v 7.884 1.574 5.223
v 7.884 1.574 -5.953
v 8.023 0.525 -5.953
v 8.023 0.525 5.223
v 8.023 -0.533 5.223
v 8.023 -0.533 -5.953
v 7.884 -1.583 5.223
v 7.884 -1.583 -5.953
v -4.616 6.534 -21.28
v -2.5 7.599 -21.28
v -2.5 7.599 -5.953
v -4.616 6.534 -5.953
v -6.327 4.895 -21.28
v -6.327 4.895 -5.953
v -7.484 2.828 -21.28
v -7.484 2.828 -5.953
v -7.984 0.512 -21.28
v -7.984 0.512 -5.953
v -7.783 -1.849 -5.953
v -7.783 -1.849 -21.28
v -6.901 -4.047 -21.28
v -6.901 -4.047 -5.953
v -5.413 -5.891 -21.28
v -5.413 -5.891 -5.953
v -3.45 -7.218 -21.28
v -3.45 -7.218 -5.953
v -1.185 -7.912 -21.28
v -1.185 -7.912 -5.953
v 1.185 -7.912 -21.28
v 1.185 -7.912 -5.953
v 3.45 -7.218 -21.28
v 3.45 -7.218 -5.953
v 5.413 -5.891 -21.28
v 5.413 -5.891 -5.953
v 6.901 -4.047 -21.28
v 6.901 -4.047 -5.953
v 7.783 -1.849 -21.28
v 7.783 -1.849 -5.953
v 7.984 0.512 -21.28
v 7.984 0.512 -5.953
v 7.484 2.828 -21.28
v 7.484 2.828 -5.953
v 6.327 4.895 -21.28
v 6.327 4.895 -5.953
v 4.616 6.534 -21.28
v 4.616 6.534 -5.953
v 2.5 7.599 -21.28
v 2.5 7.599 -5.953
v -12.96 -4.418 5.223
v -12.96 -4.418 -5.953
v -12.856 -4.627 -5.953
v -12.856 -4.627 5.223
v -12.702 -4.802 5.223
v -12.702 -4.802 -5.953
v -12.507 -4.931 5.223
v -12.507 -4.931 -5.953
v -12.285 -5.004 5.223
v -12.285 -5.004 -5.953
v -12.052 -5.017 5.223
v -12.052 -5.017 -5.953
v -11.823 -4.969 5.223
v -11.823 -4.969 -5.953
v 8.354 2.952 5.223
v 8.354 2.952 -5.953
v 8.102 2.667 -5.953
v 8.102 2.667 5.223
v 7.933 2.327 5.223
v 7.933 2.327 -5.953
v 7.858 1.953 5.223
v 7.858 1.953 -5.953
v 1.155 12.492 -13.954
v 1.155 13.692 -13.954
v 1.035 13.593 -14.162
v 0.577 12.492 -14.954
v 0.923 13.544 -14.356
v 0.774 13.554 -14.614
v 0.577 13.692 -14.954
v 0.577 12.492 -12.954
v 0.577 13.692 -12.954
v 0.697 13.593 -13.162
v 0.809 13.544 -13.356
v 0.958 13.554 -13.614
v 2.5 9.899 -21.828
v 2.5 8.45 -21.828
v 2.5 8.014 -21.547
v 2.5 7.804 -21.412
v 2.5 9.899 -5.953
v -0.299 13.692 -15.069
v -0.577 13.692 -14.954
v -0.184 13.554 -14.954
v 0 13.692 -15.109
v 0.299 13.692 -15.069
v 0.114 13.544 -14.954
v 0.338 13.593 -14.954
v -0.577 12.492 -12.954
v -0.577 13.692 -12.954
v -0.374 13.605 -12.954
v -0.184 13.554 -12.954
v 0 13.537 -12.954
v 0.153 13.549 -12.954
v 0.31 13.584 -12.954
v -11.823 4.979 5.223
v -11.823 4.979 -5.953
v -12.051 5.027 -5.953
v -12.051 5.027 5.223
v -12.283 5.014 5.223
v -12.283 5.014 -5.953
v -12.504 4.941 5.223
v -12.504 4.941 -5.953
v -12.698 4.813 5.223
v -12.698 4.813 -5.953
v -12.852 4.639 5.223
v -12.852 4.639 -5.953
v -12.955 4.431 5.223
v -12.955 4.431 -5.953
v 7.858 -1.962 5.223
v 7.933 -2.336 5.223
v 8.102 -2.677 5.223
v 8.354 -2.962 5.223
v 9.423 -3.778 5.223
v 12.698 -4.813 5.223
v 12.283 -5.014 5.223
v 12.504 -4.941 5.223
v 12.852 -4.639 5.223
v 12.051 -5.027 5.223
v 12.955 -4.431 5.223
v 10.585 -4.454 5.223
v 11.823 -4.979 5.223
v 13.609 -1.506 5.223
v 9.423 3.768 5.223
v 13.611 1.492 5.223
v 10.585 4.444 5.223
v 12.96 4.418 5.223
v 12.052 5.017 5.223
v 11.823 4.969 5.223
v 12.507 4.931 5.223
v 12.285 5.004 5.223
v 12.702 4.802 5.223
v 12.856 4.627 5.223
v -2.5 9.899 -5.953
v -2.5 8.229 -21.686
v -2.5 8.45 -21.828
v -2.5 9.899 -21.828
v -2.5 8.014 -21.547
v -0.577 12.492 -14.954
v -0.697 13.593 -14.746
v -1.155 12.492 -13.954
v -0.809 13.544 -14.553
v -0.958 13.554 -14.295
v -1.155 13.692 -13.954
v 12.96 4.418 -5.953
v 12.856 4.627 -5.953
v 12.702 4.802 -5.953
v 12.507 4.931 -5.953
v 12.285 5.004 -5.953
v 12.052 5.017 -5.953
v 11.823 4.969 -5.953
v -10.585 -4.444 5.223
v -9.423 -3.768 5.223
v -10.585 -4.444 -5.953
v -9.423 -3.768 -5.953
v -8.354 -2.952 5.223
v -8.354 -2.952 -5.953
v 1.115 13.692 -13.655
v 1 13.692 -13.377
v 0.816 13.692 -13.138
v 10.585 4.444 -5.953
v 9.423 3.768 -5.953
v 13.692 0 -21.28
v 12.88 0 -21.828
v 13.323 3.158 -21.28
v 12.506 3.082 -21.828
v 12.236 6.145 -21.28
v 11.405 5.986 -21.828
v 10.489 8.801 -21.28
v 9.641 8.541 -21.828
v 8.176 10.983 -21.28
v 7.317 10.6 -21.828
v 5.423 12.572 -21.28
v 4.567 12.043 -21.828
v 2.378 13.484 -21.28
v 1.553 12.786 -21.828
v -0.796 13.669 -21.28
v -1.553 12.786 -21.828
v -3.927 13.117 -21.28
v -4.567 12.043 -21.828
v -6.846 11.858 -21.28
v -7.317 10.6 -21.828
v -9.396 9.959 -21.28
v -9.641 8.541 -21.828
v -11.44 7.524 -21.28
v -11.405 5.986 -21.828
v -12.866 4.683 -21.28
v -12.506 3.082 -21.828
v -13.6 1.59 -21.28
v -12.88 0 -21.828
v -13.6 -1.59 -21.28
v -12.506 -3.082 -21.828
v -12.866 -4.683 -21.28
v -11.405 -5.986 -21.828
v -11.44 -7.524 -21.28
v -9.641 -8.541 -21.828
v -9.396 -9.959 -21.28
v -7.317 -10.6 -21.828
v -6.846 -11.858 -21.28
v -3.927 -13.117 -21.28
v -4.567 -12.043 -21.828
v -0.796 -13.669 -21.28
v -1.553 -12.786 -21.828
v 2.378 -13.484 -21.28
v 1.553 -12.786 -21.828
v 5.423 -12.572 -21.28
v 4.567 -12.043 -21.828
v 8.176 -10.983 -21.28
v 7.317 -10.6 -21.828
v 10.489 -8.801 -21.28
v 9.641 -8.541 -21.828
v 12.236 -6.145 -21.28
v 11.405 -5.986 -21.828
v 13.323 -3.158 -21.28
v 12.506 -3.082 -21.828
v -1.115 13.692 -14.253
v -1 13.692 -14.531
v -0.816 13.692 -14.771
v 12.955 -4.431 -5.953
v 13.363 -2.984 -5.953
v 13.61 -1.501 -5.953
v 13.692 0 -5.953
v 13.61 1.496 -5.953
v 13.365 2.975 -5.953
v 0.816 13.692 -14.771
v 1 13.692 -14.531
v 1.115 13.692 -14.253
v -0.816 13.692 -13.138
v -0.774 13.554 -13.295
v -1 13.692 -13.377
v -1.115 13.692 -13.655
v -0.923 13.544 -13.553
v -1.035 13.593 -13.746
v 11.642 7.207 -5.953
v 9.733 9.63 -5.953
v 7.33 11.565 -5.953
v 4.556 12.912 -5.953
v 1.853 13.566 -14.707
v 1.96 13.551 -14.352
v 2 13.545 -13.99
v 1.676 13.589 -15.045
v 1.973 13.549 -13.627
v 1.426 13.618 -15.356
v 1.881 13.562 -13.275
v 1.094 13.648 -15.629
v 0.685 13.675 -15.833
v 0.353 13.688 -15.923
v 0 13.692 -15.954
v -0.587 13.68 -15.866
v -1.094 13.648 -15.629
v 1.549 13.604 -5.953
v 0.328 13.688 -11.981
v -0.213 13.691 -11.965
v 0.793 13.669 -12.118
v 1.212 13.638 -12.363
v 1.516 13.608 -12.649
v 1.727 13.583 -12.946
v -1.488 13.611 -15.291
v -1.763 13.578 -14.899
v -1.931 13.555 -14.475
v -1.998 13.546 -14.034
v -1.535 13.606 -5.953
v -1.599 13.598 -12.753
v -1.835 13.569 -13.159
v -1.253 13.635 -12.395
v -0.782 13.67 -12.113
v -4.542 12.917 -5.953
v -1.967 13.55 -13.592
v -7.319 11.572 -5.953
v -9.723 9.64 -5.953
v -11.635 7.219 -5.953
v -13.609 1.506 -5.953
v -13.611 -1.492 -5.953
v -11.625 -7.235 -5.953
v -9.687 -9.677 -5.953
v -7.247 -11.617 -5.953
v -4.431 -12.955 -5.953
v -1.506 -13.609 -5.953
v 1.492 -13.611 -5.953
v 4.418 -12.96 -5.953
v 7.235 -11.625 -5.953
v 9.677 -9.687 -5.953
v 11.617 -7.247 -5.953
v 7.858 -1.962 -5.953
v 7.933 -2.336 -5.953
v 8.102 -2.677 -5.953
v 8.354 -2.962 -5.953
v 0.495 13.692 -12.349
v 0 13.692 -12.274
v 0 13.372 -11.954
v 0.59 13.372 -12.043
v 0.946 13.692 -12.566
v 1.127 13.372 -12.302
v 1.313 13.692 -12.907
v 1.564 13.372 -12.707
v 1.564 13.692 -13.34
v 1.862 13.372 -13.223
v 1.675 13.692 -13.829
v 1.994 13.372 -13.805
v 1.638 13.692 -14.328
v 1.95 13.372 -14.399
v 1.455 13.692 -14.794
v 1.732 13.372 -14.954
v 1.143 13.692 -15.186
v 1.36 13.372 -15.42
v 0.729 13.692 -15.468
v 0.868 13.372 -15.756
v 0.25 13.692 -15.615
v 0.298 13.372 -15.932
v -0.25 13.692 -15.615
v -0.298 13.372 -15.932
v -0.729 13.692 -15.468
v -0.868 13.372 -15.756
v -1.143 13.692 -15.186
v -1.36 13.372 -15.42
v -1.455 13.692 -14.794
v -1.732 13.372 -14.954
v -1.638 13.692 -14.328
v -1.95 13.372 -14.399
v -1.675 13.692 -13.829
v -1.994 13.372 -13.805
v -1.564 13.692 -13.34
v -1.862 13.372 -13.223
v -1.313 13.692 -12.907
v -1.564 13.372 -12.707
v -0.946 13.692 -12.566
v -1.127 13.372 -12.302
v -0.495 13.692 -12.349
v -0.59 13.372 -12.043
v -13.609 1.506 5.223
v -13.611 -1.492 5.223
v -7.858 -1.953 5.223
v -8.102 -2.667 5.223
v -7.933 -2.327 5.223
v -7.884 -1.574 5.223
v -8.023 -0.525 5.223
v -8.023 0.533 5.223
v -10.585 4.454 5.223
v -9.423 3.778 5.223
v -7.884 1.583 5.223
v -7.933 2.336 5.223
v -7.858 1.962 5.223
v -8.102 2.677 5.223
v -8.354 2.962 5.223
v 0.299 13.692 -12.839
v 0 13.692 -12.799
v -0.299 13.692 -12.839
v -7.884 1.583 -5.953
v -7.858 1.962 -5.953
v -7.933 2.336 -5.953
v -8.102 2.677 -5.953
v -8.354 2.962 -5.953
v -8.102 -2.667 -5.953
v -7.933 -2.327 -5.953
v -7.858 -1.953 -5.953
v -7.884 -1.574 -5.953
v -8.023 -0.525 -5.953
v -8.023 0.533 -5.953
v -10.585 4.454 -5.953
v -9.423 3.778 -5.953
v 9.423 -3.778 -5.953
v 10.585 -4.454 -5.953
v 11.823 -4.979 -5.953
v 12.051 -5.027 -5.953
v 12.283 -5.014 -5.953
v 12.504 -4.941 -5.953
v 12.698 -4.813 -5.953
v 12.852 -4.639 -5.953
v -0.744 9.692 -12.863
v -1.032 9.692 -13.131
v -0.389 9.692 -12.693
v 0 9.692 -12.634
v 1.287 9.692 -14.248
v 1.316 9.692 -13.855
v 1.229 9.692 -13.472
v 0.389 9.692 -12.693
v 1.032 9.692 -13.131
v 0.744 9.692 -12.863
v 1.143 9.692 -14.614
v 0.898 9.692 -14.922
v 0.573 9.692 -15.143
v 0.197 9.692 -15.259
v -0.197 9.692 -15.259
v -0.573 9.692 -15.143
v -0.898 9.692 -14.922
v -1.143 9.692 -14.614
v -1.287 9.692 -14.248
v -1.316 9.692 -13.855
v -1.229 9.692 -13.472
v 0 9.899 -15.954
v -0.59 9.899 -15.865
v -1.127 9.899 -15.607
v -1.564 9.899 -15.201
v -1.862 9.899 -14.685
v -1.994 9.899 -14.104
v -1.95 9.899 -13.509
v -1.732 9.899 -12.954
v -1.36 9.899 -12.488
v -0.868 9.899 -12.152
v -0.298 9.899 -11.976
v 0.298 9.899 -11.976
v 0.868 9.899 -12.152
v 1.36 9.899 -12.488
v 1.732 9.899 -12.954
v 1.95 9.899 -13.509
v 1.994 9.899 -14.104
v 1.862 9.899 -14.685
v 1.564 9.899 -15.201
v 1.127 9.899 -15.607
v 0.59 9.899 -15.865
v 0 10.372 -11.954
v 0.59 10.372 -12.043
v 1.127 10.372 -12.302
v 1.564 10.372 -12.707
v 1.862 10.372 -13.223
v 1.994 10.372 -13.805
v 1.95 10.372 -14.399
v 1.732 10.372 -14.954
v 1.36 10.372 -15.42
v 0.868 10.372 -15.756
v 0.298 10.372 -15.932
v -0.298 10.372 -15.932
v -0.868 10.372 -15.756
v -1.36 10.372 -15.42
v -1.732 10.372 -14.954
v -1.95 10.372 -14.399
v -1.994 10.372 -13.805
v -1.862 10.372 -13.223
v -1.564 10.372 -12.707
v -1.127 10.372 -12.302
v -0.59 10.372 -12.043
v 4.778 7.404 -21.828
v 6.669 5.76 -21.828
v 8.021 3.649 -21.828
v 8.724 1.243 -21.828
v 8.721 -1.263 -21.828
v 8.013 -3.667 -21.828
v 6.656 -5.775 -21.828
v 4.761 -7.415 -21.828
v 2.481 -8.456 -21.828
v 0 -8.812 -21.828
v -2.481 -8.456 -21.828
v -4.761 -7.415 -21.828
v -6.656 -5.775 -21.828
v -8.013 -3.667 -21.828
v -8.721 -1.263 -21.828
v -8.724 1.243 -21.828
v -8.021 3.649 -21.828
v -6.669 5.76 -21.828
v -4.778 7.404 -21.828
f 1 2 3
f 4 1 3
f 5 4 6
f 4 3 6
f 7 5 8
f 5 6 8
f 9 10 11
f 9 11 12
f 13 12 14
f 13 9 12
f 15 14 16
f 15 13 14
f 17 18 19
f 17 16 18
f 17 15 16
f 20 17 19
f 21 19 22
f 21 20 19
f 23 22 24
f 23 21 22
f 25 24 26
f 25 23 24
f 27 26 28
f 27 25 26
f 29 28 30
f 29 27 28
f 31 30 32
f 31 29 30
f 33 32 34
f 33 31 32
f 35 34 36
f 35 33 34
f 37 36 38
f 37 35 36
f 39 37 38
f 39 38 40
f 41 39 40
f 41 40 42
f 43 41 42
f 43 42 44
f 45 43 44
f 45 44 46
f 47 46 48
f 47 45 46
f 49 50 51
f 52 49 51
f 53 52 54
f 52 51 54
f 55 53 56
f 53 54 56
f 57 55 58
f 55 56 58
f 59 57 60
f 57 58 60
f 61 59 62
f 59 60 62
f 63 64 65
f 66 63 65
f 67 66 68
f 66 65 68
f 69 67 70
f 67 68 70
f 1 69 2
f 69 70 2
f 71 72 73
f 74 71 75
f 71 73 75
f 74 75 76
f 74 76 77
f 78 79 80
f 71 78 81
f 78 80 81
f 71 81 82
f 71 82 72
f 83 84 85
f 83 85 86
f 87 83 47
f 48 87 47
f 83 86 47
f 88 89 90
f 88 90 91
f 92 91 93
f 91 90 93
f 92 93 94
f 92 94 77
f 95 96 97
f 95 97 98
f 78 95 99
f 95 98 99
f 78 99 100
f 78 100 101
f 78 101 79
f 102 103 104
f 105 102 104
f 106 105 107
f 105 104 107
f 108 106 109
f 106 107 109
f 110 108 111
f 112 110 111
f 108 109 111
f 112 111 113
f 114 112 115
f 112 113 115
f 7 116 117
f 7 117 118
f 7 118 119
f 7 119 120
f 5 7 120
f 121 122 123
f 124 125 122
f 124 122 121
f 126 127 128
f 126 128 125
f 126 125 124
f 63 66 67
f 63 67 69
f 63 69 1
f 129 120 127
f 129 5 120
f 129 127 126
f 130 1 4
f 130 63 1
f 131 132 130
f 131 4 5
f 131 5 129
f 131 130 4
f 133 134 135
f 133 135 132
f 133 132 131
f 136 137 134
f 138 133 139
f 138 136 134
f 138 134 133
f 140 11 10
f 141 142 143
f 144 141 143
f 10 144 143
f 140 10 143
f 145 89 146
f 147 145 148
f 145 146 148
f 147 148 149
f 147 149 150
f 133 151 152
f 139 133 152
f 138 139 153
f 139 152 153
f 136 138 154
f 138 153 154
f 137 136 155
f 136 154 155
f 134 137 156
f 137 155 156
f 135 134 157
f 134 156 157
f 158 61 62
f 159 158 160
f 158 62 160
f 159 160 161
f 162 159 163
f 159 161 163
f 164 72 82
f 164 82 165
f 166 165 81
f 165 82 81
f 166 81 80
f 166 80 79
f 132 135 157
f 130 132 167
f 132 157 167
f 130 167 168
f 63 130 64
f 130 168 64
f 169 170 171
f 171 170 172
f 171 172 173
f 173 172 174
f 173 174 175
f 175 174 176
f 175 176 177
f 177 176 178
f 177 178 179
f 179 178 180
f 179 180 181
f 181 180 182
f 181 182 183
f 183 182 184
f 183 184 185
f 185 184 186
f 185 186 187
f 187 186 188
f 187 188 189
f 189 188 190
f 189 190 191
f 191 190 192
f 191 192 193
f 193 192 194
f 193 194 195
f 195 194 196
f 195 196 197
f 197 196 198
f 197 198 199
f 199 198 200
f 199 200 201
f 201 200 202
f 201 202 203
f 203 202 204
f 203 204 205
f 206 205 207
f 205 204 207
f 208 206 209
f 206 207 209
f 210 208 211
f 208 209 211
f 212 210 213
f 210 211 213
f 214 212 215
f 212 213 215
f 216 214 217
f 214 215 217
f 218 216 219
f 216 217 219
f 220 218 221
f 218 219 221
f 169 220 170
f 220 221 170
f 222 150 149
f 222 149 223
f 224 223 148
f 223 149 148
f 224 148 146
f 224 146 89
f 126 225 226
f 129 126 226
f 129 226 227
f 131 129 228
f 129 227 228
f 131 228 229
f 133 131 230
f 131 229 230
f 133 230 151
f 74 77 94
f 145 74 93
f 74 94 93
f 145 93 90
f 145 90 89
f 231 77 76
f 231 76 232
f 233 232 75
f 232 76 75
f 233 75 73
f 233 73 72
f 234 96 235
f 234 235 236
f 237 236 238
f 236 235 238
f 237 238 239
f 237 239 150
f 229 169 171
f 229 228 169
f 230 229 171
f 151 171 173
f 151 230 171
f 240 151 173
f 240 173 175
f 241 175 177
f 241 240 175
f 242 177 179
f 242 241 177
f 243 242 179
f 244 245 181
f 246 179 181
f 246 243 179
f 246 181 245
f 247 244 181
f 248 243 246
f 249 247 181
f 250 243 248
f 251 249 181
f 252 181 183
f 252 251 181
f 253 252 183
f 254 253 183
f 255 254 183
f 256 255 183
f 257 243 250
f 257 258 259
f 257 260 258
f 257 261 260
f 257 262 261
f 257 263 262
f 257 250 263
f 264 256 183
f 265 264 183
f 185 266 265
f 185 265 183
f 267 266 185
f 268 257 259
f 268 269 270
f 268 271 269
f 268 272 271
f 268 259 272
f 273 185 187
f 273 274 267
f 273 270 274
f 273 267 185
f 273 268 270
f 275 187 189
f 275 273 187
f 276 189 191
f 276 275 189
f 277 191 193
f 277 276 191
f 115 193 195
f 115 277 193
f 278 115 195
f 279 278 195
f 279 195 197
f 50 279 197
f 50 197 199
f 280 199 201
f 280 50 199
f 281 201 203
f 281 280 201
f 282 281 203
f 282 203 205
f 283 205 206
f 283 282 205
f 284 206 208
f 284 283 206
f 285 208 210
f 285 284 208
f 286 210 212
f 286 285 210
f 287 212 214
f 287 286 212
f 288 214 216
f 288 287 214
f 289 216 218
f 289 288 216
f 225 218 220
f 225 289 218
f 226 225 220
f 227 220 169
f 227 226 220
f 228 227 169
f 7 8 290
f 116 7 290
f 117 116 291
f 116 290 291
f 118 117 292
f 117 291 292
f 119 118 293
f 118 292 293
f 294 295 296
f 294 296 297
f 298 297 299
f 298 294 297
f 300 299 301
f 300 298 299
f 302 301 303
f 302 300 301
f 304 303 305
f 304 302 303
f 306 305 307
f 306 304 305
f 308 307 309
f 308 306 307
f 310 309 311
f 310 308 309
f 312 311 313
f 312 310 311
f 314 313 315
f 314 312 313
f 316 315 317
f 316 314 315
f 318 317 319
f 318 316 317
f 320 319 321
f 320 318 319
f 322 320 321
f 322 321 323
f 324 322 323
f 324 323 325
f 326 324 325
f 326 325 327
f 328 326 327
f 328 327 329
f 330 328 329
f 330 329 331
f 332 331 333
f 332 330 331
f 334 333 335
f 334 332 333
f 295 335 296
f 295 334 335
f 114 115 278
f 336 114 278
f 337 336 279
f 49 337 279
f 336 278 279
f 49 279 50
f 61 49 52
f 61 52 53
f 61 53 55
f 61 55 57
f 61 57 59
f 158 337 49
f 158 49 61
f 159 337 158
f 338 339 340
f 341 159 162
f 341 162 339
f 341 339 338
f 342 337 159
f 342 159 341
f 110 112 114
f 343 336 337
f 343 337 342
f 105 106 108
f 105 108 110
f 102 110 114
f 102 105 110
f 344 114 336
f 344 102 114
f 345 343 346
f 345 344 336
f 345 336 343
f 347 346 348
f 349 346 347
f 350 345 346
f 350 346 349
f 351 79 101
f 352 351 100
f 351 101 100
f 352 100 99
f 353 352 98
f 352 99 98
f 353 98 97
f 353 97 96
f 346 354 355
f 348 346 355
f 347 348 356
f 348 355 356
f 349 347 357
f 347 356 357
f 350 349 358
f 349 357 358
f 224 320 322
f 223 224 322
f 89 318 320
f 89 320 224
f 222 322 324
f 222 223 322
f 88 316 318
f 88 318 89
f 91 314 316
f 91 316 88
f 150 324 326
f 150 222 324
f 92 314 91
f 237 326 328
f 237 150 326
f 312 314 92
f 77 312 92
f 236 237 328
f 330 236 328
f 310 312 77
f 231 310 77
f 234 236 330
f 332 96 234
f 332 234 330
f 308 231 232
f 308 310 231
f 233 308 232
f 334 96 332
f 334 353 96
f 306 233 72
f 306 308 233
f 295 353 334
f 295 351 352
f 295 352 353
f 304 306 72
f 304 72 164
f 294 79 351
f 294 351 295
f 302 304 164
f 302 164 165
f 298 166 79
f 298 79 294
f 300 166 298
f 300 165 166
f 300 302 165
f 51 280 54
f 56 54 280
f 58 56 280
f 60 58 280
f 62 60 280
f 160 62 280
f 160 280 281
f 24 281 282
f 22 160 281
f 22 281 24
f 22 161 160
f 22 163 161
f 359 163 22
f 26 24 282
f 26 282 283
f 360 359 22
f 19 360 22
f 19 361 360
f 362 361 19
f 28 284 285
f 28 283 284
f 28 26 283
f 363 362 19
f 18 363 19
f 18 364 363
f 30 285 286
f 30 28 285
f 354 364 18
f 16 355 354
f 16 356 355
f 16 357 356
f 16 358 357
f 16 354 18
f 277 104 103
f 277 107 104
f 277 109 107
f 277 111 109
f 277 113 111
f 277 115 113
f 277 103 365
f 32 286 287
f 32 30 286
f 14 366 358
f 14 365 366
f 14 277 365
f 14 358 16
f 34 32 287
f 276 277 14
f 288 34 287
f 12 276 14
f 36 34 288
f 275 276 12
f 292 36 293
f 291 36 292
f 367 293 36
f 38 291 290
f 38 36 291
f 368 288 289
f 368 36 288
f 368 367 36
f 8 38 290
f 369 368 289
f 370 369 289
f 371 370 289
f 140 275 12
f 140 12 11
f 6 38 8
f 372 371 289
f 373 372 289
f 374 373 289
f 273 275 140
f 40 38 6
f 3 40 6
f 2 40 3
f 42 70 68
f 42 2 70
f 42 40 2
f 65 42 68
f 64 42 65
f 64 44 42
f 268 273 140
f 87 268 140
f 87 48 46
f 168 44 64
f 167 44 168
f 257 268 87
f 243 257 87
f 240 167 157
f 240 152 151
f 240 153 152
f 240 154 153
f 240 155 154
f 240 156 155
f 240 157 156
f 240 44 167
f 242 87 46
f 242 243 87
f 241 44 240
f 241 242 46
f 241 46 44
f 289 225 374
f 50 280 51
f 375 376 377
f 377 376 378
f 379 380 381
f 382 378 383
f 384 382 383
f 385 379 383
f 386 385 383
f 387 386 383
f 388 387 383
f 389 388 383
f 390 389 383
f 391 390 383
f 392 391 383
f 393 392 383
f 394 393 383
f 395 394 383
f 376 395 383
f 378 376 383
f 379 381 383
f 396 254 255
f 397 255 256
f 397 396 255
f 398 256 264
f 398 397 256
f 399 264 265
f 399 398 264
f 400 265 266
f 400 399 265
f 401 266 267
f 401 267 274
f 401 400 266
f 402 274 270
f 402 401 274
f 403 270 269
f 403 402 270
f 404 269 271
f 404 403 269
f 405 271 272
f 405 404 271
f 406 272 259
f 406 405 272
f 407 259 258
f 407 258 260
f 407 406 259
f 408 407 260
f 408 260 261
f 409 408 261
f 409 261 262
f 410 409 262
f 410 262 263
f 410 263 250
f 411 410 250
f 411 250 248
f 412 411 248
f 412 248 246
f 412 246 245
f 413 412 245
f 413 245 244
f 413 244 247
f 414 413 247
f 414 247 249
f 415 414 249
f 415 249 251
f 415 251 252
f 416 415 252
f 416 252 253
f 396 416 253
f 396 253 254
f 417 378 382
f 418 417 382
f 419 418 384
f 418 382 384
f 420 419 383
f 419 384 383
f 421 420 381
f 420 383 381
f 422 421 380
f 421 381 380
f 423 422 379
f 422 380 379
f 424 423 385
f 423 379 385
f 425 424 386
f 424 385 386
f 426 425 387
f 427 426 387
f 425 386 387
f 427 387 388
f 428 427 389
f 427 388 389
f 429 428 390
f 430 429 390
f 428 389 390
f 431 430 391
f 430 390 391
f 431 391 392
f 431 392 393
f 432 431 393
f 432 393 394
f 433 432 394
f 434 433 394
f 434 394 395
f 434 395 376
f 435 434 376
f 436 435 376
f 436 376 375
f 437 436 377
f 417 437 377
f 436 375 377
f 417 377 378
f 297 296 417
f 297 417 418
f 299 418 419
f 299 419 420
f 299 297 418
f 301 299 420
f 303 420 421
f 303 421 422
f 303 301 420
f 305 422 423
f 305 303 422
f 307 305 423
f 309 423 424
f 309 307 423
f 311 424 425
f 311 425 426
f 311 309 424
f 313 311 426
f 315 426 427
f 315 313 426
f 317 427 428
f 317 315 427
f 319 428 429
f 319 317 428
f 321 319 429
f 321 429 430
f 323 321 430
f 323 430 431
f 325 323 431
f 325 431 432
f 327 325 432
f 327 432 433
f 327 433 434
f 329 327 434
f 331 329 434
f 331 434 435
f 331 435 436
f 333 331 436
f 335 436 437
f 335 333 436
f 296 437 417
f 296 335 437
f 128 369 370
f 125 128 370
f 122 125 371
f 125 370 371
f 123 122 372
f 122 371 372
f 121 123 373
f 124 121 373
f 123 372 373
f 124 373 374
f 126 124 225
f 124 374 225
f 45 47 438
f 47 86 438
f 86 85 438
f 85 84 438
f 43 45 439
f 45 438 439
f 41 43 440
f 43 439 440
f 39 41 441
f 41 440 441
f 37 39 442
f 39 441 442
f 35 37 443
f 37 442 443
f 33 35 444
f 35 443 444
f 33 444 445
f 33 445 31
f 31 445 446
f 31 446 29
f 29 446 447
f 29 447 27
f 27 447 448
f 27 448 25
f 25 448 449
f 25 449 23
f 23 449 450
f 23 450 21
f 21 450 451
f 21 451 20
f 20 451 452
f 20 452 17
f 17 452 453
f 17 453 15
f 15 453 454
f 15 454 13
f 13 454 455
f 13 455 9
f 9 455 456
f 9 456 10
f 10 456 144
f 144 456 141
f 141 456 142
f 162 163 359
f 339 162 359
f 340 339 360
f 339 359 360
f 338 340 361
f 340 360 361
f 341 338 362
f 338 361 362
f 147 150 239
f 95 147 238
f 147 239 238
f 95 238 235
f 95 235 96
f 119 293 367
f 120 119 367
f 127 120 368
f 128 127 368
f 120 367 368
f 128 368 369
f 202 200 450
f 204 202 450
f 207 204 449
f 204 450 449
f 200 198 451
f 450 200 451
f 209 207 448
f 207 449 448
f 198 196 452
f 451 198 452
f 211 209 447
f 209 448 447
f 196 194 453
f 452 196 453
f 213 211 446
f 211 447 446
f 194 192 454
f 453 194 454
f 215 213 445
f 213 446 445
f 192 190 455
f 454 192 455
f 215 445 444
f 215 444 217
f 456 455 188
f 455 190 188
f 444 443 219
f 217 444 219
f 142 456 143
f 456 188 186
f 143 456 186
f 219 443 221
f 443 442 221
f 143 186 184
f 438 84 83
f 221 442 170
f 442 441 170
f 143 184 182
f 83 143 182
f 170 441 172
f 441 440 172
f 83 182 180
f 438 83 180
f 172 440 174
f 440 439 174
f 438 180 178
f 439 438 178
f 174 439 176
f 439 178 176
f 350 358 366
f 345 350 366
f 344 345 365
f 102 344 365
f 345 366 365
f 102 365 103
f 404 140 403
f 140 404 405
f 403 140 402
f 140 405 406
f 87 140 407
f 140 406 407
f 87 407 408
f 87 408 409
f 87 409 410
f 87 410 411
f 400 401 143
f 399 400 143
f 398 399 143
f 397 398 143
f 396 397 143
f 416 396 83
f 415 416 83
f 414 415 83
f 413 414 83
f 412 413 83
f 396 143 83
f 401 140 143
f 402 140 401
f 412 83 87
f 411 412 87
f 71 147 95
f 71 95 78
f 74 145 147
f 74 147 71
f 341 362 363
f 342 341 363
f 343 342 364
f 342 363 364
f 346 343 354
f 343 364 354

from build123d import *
from OCP.BRepFilletAPI import BRepFilletAPI_MakeChamfer

# Parameters (mm, degrees)
BOSS_EXTRUDE1_START     = -5.953125
SKETCH1_R               = 13.6921875
BOSS_EXTRUDE1_DEPTH     = 15.875
BOSS_EXTRUDE5_START     = 11.176
BOSS_EXTRUDE5_DEPTH     = 11.176
MOVE_START              = -5.953125
MOVE_FACE1_DEPTH        = 11.176
MOVE_FACE1_2_DEPTH      = 11.176
CIRPATTERN3_START       = -5.953125
CIRPATTERN3_DEPTH       = 11.176
CUT_EXTRUDE5_DEPTH      = 30.179085628
CUT_EXTRUDE5_DEPTH_BACK = 30.179085628
SKETCH15_R              = 8
CHAMFER1_SIZE           = 0.5476875
CHAMFER1_SIZE2          = 0.81198011
CUT_EXTRUDE1_DEPTH      = 30.179085628
CUT_EXTRUDE1_DEPTH_BACK = 30.179085628
SKETCH5_R               = 2
CUT_EXTRUDE2_DEPTH      = 30.179085628
SKETCH6_R               = 2
BOSS_EXTRUDE3_DEPTH     = 4
CUT_EXTRUDE3_DEPTH      = 1.2
CHAMFER3_SIZE           = 0.32
CHAMFER4_SIZE           = 0.68


# Read off the part's stored shape, not the designer's step: Move Face1, CirPattern3
with BuildPart() as part:
    # Sketch1 → Boss-Extrude1 (new body)
    with BuildSketch(Plane.XY.offset(BOSS_EXTRUDE1_START)):
        Circle(SKETCH1_R)
    extrude(amount=-BOSS_EXTRUDE1_DEPTH)

    # Sketch11 → Boss-Extrude5 (add)
    with BuildSketch(Plane.XY.offset(-5.953125).offset(BOSS_EXTRUDE5_START)):
        with BuildLine():
            ThreePointArc((-1.582501, -7.883505579), (-0.004369034, -8.040686324), (1.573762932, -7.883505579))
            ThreePointArc((1.573762932, -7.883505579), (2.326569083, -7.932638836), (2.952339417, -8.353996958))
            ThreePointArc((2.952339417, -8.353996958), (4.124174772, -9.993538922), (4.969226713, -11.823069782))
            ThreePointArc((4.969226713, -11.823069782), (4.930575443, -12.50660364), (4.417578974, -12.959976641))
            ThreePointArc((4.417578974, -12.959976641), (-0.006979455, -13.692185721), (-4.430789112, -12.955466274))
            ThreePointArc((-4.430789112, -12.955466274), (-4.941191352, -12.503649266), (-4.979409431, -11.823069782))
            ThreePointArc((-4.979409431, -11.823069782), (-4.13390788, -9.993483356), (-2.961583815, -8.353996958))
            ThreePointArc((-2.961583815, -8.353996958), (-2.335546152, -7.932611995), (-1.582501, -7.883505579))
        make_face()
    extrude(amount=-BOSS_EXTRUDE5_DEPTH)

    # Move Face1 outline → Move Face1 (cut)
    with BuildSketch(Plane.XY.offset(MOVE_START)):
        with BuildLine():
            ThreePointArc((-4.430789112, -12.955466274), (-0.006979455, -13.692185721), (4.417578974, -12.959976641))
            ThreePointArc((4.417578974, -12.959976641), (4.930575443, -12.50660364), (4.969226713, -11.823069782))
            ThreePointArc((4.969226713, -11.823069782), (4.124174772, -9.993538922), (2.952339417, -8.353996958))
            ThreePointArc((2.952339417, -8.353996958), (2.326569083, -7.932638836), (1.573762932, -7.883505579))
            ThreePointArc((1.573762932, -7.883505579), (-0.004369034, -8.040686324), (-1.582501, -7.883505579))
            ThreePointArc((-1.582501, -7.883505579), (-2.335546152, -7.932611995), (-2.961583815, -8.353996958))
            ThreePointArc((-2.961583815, -8.353996958), (-4.13390788, -9.993483356), (-4.979409431, -11.823069782))
            ThreePointArc((-4.979409431, -11.823069782), (-4.941191352, -12.503649266), (-4.430789112, -12.955466274))
        make_face()
    extrude(amount=MOVE_FACE1_DEPTH, mode=Mode.SUBTRACT)

    # Move Face1 2 outline → Move Face1 2 (add)
    with BuildSketch(Plane.XY.offset(MOVE_START)):
        with BuildLine():
            ThreePointArc((7.883505579, -1.582501), (7.932611995, -2.335546152), (8.353996958, -2.961583815))
            ThreePointArc((8.353996958, -2.961583815), (9.993483356, -4.13390788), (11.823069782, -4.979409431))
            ThreePointArc((11.823069782, -4.979409431), (12.503649266, -4.941191352), (12.955466274, -4.430789112))
            ThreePointArc((12.955466274, -4.430789112), (13.692185721, -0.006979455), (12.959976641, 4.417578974))
            ThreePointArc((12.959976641, 4.417578974), (12.50660364, 4.930575443), (11.823069782, 4.969226713))
            ThreePointArc((11.823069782, 4.969226713), (9.993538922, 4.124174772), (8.353996958, 2.952339417))
            ThreePointArc((8.353996958, 2.952339417), (7.932638836, 2.326569083), (7.883505579, 1.573762932))
            ThreePointArc((7.883505579, 1.573762932), (8.040686324, -0.004369034), (7.883505579, -1.582501))
        make_face()
    extrude(amount=MOVE_FACE1_2_DEPTH)

    # CirPattern3 outline → CirPattern3 (add)
    with BuildSketch(Plane.XY.offset(CIRPATTERN3_START)):
        with BuildLine():
            ThreePointArc((-7.883505579, 1.582501), (-7.932611995, 2.335546152), (-8.353996958, 2.961583815))
            ThreePointArc((-8.353996958, 2.961583815), (-9.993483356, 4.13390788), (-11.823069782, 4.979409431))
            ThreePointArc((-11.823069782, 4.979409431), (-12.503649266, 4.941191352), (-12.955466274, 4.430789112))
            ThreePointArc((-12.955466274, 4.430789112), (-13.692185721, 0.006979455), (-12.959976641, -4.417578974))
            ThreePointArc((-12.959976641, -4.417578974), (-12.50660364, -4.930575443), (-11.823069782, -4.969226713))
            ThreePointArc((-11.823069782, -4.969226713), (-9.993538922, -4.124174772), (-8.353996958, -2.952339417))
            ThreePointArc((-8.353996958, -2.952339417), (-7.932638836, -2.326569083), (-7.883505579, -1.573762932))
            ThreePointArc((-7.883505579, -1.573762932), (-8.040686324, 0.004369034), (-7.883505579, 1.582501))
        make_face()
    extrude(amount=CIRPATTERN3_DEPTH)

    # Sketch15 → Cut-Extrude5 (cut, two sides: drawn at the far end of the back side and taken through both)
    with BuildSketch(Plane.XY.offset(-CUT_EXTRUDE5_DEPTH_BACK)):
        Circle(SKETCH15_R)
    extrude(amount=CUT_EXTRUDE5_DEPTH + CUT_EXTRUDE5_DEPTH_BACK, mode=Mode.SUBTRACT)

    # Chamfer1: one chamfer whose edges measure the first distance from different faces: ONE call of the kernel's chamfer builder (chamfer() names one face for all edges)
    chamfer1_edges_1 = [part.edges().sort_by_distance(p)[0] for p in [
        (-13.6921875, 0, -21.828125),
    ]]
    chamfer1_side_1 = [part.faces().sort_by_distance(p)[0] for p in [
        (-13.6921875, 0, -13.890625),
    ]]
    chamfer1_edges_2 = [part.edges().sort_by_distance(p)[0] for p in [
        (-8, 0, -21.828125),
    ]]
    chamfer1_side_2 = [part.faces().sort_by_distance(p)[0] for p in [
        (-8, 0, -13.890625),
    ]]
    chamfer1 = BRepFilletAPI_MakeChamfer(part.part.solid().wrapped)
    for e in chamfer1_edges_1:
        chamfer1.Add(CHAMFER1_SIZE, CHAMFER1_SIZE2, e.wrapped, chamfer1_side_1[0].wrapped)  # the first distance lies on this face
    for e in chamfer1_edges_2:
        chamfer1.Add(CHAMFER1_SIZE, CHAMFER1_SIZE2, e.wrapped, chamfer1_side_2[0].wrapped)  # the first distance lies on this face
    add(Compound.cast(chamfer1.Shape()), mode=Mode.REPLACE)

    # Sketch4 → Cut-Extrude1 (cut, two sides: drawn at the far end of the back side and taken through both)
    with BuildSketch(Plane.XY.offset(-CUT_EXTRUDE1_DEPTH_BACK)):
        with BuildLine():
            Line((-2.5, 9.899342077), (2.5, 9.899342077))
            Line((2.5, 9.899342077), (2.5, 7.599342077))
            ThreePointArc((2.5, 7.599342077), (0, 8), (-2.5, 7.599342077))
            Line((-2.5, 7.599342077), (-2.5, 9.899342077))
        make_face()
    extrude(amount=CUT_EXTRUDE1_DEPTH + CUT_EXTRUDE1_DEPTH_BACK, mode=Mode.SUBTRACT)

    # Sketch5 → Cut-Extrude2 (cut, through all)
    with BuildSketch(Plane(origin=(0, 0, 0), x_dir=(1, 0, 0), z_dir=(0, 1, 0))):
        with Locations(Location((0, 13.954125, 0), (0, 0, 90))):
            Circle(SKETCH5_R)
    extrude(amount=CUT_EXTRUDE2_DEPTH, mode=Mode.SUBTRACT)


with BuildPart() as body_2:
    # Sketch6 → Boss-Extrude3 (new body)
    with BuildSketch(Plane(origin=(0, 13.6921875, 0), x_dir=(-1, 0, 0), z_dir=(0, 1, 0))):
        with Locations(Location((0, -13.954125, 0), (0, 0, 90))):
            Circle(SKETCH6_R)
    extrude(amount=-BOSS_EXTRUDE3_DEPTH)

    # Sketch8 → Cut-Extrude3 (cut)
    with BuildSketch(Plane(origin=(0, 13.6921875, 0), x_dir=(1, 0, 0), z_dir=(0, 1, 0))):
        Polygon((0.577350269, 12.954125), (1.154700538, 13.954125), (0.577350269, 14.954125), (-0.577350269, 14.954125), (-1.154700538, 13.954125), (-0.577350269, 12.954125), align=None)
    extrude(amount=-CUT_EXTRUDE3_DEPTH, mode=Mode.SUBTRACT)

    # Cut-Extrude4 cone 1 section (through the dimple's axis) → Cut-Extrude4 (revolve, cut)
    with BuildSketch(Plane(origin=(0, 13.6921875, -13.954125), x_dir=(0, 0, 1), z_dir=(1, 0, 0))):
        Polygon((0, 0), (1.154700538, 0), (0, 1.154700538), align=None)
    revolve(axis=Axis((0, 13.6921875, -13.954125), (0, -1, 0)), mode=Mode.SUBTRACT)

    # Chamfer3
    chamfer3_edges = [body_2.edges().sort_by_distance(p)[0] for p in [
        (0, 13.6921875, -15.954125),
    ]]
    chamfer(chamfer3_edges, length=CHAMFER3_SIZE)

    # Chamfer4
    chamfer4_edges = [body_2.edges().sort_by_distance(p)[0] for p in [
        (0, 9.6921875, -15.954125),
    ]]
    chamfer(chamfer4_edges, length=CHAMFER4_SIZE)


solid = Compound([part.part, body_2.part])
